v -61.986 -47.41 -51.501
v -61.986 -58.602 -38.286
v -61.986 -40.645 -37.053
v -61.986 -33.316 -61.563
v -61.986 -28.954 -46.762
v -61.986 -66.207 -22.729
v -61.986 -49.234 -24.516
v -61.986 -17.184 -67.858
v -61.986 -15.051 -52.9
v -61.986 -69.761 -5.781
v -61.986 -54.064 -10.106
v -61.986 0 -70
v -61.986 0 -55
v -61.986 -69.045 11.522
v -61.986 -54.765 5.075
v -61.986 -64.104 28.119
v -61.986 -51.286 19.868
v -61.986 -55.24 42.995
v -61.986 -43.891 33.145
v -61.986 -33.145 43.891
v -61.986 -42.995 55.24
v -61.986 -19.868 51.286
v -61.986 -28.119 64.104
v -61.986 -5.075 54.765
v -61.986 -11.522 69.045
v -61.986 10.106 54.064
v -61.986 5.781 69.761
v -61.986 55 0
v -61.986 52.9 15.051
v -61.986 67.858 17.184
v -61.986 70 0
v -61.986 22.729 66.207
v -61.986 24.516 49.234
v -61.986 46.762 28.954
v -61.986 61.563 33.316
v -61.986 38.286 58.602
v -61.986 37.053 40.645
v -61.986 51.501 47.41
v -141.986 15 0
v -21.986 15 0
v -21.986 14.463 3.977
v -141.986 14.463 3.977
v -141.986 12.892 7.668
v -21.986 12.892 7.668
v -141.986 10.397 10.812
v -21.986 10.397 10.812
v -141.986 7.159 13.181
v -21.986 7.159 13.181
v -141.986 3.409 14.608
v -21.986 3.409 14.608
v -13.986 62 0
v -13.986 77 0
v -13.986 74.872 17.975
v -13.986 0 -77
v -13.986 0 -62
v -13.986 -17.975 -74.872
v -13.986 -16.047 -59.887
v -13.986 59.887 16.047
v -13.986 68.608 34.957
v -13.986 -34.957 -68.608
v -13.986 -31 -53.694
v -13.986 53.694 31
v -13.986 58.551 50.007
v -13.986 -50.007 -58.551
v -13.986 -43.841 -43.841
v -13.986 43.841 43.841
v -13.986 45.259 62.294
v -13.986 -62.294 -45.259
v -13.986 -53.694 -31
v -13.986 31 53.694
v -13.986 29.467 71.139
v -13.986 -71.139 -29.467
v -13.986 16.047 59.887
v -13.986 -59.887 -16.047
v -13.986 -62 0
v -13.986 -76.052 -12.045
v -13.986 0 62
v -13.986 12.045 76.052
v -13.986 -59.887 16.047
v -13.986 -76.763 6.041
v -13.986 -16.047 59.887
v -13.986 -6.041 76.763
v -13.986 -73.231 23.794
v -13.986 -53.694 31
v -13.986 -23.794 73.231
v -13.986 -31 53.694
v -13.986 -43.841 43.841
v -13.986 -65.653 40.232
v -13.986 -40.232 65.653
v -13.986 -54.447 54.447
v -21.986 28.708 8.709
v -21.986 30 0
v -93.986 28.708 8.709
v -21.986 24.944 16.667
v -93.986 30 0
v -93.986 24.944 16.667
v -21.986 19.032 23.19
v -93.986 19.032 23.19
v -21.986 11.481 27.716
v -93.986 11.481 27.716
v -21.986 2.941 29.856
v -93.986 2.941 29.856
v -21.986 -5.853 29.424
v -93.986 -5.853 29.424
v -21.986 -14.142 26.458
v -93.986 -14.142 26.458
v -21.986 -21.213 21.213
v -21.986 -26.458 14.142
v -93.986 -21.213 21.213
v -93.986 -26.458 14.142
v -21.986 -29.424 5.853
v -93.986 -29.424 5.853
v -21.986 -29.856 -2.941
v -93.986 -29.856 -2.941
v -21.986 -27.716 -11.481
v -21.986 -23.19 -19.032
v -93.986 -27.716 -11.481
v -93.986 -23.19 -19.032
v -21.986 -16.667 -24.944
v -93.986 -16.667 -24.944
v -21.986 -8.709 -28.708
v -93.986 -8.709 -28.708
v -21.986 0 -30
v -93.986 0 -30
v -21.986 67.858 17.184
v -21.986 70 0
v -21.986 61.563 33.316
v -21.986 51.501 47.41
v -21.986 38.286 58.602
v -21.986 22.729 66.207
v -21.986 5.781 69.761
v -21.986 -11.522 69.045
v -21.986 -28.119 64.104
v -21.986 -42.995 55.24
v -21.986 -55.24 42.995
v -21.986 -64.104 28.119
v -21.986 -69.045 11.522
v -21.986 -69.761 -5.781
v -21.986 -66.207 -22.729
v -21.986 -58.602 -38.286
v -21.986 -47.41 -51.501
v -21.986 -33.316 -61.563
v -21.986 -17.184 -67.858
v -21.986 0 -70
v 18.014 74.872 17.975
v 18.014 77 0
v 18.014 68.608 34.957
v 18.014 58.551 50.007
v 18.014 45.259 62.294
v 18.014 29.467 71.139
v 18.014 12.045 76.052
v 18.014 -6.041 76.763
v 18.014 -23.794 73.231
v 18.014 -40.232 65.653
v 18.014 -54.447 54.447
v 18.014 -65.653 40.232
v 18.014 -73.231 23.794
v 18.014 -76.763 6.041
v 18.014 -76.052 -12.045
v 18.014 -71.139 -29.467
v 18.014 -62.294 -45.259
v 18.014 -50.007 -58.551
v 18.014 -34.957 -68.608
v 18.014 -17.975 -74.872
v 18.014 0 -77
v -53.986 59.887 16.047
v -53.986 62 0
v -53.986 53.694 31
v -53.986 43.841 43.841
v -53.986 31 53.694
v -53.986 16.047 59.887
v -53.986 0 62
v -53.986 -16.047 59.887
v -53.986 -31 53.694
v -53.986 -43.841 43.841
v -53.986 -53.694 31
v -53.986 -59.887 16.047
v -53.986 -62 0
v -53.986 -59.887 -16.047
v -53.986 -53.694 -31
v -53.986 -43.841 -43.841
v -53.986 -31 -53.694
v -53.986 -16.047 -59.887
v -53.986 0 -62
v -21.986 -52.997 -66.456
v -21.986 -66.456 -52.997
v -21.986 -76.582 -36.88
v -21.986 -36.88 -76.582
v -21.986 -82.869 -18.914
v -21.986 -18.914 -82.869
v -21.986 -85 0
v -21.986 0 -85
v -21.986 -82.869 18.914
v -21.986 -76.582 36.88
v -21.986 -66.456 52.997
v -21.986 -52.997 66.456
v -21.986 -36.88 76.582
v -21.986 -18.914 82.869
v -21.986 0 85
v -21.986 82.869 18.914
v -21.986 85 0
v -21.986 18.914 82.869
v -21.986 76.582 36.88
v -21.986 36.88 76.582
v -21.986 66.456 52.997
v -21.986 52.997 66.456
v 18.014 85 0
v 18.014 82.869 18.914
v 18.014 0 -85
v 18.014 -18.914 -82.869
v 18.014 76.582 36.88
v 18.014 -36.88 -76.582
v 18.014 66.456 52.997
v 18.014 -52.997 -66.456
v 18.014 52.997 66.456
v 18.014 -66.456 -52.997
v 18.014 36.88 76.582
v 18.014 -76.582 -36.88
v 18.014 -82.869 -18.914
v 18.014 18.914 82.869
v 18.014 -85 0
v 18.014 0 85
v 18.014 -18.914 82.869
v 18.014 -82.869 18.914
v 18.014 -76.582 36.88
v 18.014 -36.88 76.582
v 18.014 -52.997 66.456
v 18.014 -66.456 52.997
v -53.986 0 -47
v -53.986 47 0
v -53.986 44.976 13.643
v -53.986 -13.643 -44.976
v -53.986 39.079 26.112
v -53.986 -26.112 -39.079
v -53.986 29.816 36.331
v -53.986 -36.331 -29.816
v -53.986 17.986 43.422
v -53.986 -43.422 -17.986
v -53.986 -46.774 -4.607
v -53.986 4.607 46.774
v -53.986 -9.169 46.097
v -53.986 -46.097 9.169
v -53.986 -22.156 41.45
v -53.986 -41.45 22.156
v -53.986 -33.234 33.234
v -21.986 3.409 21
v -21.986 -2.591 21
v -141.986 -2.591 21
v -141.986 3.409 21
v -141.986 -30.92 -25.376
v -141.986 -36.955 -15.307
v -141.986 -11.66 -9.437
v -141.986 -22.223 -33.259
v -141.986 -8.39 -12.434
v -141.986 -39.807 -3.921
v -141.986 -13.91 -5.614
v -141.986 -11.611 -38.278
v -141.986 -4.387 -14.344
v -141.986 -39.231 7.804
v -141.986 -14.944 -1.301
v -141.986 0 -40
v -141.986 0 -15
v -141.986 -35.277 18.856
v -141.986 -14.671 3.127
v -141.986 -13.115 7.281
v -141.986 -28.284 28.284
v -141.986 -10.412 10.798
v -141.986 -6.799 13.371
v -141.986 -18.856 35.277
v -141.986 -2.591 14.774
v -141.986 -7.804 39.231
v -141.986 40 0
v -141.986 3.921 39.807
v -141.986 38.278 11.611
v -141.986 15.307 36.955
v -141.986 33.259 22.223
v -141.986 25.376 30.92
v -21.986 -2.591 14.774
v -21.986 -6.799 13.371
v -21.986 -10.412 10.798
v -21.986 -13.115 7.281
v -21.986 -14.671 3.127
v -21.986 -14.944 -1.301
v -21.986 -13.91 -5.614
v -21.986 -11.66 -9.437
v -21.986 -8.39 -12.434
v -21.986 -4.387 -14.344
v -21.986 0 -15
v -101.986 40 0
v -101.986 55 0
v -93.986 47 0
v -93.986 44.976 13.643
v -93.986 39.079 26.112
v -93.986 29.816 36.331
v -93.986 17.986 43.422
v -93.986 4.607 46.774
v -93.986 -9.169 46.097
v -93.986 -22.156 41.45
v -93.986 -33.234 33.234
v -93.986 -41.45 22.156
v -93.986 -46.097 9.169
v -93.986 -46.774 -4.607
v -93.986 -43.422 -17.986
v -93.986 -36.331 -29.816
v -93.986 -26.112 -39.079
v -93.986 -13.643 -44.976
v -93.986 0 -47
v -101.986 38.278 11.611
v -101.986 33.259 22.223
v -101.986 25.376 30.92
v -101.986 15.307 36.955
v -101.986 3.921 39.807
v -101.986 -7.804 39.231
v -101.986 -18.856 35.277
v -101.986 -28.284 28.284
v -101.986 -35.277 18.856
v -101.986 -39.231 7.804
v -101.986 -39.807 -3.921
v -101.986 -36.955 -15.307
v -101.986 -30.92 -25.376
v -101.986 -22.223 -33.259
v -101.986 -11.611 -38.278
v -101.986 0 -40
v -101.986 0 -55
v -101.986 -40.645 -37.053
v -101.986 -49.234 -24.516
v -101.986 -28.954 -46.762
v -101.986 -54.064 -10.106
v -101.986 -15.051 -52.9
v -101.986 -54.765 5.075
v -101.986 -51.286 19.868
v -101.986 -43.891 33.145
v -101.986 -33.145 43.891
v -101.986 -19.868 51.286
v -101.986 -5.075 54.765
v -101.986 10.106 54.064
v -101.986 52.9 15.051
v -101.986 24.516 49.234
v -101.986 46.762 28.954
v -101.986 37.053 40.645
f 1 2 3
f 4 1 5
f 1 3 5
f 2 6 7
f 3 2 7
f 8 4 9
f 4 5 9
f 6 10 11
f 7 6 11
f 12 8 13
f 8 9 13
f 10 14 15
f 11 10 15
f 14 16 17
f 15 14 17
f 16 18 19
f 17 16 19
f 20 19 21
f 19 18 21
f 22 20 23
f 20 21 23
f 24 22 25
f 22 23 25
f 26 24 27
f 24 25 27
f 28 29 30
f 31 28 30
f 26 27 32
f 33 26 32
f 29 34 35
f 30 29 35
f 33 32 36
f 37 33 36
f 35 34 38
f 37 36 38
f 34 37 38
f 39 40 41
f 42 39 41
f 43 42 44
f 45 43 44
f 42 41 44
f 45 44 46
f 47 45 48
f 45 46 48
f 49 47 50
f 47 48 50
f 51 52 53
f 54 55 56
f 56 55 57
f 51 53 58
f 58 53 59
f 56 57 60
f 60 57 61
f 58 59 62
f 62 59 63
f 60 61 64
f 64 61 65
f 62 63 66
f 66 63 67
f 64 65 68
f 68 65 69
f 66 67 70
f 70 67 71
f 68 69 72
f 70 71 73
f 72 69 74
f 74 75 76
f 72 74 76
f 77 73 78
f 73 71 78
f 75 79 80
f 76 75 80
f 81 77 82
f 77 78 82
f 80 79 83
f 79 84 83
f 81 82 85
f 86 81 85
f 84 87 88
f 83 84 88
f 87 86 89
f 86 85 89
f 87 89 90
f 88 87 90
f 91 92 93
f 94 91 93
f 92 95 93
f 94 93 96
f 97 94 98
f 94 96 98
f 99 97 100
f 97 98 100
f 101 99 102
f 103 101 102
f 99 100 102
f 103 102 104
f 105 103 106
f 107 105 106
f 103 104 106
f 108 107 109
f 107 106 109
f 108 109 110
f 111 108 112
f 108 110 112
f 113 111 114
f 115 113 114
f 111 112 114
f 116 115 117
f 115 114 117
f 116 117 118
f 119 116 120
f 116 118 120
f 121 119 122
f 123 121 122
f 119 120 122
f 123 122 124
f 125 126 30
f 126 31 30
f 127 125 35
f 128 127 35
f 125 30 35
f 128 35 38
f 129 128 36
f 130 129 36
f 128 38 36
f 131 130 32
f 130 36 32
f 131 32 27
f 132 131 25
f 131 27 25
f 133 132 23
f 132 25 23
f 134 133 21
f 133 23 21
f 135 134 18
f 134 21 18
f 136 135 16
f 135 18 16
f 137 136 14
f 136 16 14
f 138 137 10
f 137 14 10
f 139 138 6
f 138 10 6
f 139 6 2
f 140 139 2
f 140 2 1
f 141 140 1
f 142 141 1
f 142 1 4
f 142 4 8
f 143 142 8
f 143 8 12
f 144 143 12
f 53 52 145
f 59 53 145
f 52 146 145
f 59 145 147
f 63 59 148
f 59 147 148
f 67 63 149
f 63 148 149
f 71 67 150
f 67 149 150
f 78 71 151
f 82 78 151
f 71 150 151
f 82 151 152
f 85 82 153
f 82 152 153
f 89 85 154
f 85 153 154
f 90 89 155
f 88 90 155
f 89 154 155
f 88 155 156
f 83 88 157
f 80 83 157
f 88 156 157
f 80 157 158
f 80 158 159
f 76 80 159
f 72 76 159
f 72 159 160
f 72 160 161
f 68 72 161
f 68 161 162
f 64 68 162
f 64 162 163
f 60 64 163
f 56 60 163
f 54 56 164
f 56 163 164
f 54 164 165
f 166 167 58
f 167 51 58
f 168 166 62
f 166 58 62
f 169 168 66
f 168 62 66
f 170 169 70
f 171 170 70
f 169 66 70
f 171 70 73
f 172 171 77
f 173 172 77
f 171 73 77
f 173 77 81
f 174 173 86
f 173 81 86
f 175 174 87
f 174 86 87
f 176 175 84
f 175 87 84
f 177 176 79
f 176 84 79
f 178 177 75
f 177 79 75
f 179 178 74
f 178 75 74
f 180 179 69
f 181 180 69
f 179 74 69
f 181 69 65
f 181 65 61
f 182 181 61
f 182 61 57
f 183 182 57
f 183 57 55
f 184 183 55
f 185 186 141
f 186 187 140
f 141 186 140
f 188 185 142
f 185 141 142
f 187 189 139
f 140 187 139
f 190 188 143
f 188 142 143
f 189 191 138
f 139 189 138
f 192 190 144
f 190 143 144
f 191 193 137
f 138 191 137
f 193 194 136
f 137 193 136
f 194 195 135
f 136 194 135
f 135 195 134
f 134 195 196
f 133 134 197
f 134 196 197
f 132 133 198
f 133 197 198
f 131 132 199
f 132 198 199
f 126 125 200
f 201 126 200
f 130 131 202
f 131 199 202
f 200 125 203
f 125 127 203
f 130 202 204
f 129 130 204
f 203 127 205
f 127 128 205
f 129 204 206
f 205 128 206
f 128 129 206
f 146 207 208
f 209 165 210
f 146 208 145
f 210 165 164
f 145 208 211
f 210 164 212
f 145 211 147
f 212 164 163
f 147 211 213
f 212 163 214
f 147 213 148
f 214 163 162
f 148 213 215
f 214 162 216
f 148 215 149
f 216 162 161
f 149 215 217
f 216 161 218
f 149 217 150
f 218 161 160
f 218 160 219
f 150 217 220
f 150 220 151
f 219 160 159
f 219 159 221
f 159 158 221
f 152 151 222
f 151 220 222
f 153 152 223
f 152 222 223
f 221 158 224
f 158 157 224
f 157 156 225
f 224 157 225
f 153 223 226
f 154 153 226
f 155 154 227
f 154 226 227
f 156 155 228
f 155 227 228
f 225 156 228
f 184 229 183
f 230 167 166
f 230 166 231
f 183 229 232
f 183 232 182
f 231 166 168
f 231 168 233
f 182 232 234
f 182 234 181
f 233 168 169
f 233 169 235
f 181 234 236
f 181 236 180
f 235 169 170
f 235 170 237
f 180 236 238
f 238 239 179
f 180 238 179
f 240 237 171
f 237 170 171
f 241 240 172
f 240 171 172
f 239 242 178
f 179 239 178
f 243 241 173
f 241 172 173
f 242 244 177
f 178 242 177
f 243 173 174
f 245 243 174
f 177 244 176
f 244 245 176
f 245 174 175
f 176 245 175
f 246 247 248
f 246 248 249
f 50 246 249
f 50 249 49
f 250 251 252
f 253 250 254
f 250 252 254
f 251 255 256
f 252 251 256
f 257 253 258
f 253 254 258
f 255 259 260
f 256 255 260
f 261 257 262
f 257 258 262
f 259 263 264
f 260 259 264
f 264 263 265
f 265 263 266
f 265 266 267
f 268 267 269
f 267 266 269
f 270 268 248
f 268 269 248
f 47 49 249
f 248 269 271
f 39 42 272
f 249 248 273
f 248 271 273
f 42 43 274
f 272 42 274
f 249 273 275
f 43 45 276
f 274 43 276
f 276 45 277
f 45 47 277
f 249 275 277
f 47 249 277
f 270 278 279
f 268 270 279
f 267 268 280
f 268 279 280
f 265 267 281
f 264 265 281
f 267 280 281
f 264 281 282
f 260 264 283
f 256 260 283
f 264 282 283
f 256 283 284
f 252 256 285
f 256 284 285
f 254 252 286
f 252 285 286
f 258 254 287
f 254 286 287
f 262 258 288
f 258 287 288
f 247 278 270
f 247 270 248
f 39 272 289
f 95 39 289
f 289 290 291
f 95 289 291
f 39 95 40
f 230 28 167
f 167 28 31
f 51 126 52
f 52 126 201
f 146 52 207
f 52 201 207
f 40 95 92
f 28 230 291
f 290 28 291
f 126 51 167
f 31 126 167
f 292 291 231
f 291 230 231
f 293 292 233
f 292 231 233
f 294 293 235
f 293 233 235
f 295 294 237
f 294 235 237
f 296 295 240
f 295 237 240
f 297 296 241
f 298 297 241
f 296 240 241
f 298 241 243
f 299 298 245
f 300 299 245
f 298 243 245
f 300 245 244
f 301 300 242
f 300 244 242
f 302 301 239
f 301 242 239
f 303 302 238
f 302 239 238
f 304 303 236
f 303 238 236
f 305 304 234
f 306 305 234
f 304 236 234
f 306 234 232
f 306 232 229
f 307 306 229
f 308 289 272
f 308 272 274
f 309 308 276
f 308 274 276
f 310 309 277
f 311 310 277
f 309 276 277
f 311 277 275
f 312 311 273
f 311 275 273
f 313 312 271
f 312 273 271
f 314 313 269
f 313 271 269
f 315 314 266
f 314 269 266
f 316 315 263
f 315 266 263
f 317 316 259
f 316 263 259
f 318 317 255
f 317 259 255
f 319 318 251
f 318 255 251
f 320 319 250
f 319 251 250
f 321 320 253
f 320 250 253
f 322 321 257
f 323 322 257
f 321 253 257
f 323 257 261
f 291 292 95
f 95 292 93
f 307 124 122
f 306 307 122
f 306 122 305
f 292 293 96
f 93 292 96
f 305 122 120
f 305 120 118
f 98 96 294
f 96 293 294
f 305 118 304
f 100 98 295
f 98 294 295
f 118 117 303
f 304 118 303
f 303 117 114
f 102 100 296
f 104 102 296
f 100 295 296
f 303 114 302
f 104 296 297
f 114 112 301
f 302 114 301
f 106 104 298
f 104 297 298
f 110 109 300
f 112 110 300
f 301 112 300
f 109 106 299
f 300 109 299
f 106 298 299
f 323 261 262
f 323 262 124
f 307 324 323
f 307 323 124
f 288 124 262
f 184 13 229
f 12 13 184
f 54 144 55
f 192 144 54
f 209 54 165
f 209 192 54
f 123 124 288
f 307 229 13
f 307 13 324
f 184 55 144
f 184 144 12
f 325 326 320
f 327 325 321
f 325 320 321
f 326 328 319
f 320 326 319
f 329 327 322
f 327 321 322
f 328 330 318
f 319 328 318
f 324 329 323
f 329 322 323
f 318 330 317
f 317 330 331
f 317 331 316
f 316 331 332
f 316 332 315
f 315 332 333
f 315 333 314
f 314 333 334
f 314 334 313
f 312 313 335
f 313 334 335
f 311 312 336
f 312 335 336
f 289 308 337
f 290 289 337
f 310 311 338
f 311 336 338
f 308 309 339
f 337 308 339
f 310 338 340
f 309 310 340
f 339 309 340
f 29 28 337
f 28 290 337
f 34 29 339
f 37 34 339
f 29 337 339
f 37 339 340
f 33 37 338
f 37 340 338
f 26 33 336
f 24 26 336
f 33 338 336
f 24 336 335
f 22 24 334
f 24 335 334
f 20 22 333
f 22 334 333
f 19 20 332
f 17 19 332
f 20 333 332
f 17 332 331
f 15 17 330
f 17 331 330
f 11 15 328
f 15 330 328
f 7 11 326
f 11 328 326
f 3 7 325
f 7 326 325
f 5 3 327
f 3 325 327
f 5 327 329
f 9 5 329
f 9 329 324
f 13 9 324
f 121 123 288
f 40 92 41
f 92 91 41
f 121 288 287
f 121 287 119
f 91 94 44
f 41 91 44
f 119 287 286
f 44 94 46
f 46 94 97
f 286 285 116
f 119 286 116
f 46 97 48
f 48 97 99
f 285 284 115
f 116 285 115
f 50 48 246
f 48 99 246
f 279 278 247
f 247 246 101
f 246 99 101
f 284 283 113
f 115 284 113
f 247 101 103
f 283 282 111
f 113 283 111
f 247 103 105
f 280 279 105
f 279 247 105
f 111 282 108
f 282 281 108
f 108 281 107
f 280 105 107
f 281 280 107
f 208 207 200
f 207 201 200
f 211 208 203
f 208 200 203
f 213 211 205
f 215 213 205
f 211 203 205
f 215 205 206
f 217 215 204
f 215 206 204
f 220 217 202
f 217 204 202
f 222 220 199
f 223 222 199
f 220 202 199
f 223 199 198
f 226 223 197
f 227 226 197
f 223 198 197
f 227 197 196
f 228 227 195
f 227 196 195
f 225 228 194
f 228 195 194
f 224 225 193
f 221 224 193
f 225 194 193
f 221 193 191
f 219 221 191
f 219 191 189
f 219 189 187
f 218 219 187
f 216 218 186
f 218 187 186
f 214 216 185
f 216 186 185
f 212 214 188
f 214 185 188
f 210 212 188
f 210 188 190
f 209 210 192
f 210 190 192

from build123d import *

# Parameters (mm, degrees)
REVOLVE1_ANGLE     = 270
CUT_EXTRUDE3_START = -120
CUT_EXTRUDE3_DEPTH = 120


# Read off the part's stored shape, not the designer's step: Cut-Extrude3
with BuildPart() as part:
    # Sketch1 → Revolve1 (revolve)
    with BuildSketch(Plane.XY):
        Polygon((-141.986286211, 15), (-21.986286211, 15), (-21.986286211, 30), (-93.986286211, 30), (-93.986286211, 47), (-53.986286211, 47), (-53.986286211, 62), (-13.986286211, 62), (-13.986286211, 77), (18.013713789, 77), (18.013713789, 85), (-21.986286211, 85), (-21.986286211, 70), (-61.986286211, 70), (-61.986286211, 55), (-101.986286211, 55), (-101.986286211, 40), (-141.986286211, 40), align=None)
    revolve(axis=Axis((-141.986286211, 0, 0), (1, 0, 0)), revolution_arc=REVOLVE1_ANGLE)

    # Cut-Extrude3 outline → Cut-Extrude3 (cut)
    with BuildSketch(Plane.ZY.offset(141.986286211).offset(CUT_EXTRUDE3_START)):
        with BuildLine():
            Line((14.774482913, -2.591265069), (21, -2.591265069))
            Line((21, -2.591265069), (21, 3.408734931))
            Line((21, 3.408734931), (14.607550314, 3.408734931))
            ThreePointArc((14.607550314, 3.408734931), (14.994197849, 0.41717007), (14.774482913, -2.591265069))
        make_face()
    extrude(amount=CUT_EXTRUDE3_DEPTH, mode=Mode.SUBTRACT)


solid = part.part
